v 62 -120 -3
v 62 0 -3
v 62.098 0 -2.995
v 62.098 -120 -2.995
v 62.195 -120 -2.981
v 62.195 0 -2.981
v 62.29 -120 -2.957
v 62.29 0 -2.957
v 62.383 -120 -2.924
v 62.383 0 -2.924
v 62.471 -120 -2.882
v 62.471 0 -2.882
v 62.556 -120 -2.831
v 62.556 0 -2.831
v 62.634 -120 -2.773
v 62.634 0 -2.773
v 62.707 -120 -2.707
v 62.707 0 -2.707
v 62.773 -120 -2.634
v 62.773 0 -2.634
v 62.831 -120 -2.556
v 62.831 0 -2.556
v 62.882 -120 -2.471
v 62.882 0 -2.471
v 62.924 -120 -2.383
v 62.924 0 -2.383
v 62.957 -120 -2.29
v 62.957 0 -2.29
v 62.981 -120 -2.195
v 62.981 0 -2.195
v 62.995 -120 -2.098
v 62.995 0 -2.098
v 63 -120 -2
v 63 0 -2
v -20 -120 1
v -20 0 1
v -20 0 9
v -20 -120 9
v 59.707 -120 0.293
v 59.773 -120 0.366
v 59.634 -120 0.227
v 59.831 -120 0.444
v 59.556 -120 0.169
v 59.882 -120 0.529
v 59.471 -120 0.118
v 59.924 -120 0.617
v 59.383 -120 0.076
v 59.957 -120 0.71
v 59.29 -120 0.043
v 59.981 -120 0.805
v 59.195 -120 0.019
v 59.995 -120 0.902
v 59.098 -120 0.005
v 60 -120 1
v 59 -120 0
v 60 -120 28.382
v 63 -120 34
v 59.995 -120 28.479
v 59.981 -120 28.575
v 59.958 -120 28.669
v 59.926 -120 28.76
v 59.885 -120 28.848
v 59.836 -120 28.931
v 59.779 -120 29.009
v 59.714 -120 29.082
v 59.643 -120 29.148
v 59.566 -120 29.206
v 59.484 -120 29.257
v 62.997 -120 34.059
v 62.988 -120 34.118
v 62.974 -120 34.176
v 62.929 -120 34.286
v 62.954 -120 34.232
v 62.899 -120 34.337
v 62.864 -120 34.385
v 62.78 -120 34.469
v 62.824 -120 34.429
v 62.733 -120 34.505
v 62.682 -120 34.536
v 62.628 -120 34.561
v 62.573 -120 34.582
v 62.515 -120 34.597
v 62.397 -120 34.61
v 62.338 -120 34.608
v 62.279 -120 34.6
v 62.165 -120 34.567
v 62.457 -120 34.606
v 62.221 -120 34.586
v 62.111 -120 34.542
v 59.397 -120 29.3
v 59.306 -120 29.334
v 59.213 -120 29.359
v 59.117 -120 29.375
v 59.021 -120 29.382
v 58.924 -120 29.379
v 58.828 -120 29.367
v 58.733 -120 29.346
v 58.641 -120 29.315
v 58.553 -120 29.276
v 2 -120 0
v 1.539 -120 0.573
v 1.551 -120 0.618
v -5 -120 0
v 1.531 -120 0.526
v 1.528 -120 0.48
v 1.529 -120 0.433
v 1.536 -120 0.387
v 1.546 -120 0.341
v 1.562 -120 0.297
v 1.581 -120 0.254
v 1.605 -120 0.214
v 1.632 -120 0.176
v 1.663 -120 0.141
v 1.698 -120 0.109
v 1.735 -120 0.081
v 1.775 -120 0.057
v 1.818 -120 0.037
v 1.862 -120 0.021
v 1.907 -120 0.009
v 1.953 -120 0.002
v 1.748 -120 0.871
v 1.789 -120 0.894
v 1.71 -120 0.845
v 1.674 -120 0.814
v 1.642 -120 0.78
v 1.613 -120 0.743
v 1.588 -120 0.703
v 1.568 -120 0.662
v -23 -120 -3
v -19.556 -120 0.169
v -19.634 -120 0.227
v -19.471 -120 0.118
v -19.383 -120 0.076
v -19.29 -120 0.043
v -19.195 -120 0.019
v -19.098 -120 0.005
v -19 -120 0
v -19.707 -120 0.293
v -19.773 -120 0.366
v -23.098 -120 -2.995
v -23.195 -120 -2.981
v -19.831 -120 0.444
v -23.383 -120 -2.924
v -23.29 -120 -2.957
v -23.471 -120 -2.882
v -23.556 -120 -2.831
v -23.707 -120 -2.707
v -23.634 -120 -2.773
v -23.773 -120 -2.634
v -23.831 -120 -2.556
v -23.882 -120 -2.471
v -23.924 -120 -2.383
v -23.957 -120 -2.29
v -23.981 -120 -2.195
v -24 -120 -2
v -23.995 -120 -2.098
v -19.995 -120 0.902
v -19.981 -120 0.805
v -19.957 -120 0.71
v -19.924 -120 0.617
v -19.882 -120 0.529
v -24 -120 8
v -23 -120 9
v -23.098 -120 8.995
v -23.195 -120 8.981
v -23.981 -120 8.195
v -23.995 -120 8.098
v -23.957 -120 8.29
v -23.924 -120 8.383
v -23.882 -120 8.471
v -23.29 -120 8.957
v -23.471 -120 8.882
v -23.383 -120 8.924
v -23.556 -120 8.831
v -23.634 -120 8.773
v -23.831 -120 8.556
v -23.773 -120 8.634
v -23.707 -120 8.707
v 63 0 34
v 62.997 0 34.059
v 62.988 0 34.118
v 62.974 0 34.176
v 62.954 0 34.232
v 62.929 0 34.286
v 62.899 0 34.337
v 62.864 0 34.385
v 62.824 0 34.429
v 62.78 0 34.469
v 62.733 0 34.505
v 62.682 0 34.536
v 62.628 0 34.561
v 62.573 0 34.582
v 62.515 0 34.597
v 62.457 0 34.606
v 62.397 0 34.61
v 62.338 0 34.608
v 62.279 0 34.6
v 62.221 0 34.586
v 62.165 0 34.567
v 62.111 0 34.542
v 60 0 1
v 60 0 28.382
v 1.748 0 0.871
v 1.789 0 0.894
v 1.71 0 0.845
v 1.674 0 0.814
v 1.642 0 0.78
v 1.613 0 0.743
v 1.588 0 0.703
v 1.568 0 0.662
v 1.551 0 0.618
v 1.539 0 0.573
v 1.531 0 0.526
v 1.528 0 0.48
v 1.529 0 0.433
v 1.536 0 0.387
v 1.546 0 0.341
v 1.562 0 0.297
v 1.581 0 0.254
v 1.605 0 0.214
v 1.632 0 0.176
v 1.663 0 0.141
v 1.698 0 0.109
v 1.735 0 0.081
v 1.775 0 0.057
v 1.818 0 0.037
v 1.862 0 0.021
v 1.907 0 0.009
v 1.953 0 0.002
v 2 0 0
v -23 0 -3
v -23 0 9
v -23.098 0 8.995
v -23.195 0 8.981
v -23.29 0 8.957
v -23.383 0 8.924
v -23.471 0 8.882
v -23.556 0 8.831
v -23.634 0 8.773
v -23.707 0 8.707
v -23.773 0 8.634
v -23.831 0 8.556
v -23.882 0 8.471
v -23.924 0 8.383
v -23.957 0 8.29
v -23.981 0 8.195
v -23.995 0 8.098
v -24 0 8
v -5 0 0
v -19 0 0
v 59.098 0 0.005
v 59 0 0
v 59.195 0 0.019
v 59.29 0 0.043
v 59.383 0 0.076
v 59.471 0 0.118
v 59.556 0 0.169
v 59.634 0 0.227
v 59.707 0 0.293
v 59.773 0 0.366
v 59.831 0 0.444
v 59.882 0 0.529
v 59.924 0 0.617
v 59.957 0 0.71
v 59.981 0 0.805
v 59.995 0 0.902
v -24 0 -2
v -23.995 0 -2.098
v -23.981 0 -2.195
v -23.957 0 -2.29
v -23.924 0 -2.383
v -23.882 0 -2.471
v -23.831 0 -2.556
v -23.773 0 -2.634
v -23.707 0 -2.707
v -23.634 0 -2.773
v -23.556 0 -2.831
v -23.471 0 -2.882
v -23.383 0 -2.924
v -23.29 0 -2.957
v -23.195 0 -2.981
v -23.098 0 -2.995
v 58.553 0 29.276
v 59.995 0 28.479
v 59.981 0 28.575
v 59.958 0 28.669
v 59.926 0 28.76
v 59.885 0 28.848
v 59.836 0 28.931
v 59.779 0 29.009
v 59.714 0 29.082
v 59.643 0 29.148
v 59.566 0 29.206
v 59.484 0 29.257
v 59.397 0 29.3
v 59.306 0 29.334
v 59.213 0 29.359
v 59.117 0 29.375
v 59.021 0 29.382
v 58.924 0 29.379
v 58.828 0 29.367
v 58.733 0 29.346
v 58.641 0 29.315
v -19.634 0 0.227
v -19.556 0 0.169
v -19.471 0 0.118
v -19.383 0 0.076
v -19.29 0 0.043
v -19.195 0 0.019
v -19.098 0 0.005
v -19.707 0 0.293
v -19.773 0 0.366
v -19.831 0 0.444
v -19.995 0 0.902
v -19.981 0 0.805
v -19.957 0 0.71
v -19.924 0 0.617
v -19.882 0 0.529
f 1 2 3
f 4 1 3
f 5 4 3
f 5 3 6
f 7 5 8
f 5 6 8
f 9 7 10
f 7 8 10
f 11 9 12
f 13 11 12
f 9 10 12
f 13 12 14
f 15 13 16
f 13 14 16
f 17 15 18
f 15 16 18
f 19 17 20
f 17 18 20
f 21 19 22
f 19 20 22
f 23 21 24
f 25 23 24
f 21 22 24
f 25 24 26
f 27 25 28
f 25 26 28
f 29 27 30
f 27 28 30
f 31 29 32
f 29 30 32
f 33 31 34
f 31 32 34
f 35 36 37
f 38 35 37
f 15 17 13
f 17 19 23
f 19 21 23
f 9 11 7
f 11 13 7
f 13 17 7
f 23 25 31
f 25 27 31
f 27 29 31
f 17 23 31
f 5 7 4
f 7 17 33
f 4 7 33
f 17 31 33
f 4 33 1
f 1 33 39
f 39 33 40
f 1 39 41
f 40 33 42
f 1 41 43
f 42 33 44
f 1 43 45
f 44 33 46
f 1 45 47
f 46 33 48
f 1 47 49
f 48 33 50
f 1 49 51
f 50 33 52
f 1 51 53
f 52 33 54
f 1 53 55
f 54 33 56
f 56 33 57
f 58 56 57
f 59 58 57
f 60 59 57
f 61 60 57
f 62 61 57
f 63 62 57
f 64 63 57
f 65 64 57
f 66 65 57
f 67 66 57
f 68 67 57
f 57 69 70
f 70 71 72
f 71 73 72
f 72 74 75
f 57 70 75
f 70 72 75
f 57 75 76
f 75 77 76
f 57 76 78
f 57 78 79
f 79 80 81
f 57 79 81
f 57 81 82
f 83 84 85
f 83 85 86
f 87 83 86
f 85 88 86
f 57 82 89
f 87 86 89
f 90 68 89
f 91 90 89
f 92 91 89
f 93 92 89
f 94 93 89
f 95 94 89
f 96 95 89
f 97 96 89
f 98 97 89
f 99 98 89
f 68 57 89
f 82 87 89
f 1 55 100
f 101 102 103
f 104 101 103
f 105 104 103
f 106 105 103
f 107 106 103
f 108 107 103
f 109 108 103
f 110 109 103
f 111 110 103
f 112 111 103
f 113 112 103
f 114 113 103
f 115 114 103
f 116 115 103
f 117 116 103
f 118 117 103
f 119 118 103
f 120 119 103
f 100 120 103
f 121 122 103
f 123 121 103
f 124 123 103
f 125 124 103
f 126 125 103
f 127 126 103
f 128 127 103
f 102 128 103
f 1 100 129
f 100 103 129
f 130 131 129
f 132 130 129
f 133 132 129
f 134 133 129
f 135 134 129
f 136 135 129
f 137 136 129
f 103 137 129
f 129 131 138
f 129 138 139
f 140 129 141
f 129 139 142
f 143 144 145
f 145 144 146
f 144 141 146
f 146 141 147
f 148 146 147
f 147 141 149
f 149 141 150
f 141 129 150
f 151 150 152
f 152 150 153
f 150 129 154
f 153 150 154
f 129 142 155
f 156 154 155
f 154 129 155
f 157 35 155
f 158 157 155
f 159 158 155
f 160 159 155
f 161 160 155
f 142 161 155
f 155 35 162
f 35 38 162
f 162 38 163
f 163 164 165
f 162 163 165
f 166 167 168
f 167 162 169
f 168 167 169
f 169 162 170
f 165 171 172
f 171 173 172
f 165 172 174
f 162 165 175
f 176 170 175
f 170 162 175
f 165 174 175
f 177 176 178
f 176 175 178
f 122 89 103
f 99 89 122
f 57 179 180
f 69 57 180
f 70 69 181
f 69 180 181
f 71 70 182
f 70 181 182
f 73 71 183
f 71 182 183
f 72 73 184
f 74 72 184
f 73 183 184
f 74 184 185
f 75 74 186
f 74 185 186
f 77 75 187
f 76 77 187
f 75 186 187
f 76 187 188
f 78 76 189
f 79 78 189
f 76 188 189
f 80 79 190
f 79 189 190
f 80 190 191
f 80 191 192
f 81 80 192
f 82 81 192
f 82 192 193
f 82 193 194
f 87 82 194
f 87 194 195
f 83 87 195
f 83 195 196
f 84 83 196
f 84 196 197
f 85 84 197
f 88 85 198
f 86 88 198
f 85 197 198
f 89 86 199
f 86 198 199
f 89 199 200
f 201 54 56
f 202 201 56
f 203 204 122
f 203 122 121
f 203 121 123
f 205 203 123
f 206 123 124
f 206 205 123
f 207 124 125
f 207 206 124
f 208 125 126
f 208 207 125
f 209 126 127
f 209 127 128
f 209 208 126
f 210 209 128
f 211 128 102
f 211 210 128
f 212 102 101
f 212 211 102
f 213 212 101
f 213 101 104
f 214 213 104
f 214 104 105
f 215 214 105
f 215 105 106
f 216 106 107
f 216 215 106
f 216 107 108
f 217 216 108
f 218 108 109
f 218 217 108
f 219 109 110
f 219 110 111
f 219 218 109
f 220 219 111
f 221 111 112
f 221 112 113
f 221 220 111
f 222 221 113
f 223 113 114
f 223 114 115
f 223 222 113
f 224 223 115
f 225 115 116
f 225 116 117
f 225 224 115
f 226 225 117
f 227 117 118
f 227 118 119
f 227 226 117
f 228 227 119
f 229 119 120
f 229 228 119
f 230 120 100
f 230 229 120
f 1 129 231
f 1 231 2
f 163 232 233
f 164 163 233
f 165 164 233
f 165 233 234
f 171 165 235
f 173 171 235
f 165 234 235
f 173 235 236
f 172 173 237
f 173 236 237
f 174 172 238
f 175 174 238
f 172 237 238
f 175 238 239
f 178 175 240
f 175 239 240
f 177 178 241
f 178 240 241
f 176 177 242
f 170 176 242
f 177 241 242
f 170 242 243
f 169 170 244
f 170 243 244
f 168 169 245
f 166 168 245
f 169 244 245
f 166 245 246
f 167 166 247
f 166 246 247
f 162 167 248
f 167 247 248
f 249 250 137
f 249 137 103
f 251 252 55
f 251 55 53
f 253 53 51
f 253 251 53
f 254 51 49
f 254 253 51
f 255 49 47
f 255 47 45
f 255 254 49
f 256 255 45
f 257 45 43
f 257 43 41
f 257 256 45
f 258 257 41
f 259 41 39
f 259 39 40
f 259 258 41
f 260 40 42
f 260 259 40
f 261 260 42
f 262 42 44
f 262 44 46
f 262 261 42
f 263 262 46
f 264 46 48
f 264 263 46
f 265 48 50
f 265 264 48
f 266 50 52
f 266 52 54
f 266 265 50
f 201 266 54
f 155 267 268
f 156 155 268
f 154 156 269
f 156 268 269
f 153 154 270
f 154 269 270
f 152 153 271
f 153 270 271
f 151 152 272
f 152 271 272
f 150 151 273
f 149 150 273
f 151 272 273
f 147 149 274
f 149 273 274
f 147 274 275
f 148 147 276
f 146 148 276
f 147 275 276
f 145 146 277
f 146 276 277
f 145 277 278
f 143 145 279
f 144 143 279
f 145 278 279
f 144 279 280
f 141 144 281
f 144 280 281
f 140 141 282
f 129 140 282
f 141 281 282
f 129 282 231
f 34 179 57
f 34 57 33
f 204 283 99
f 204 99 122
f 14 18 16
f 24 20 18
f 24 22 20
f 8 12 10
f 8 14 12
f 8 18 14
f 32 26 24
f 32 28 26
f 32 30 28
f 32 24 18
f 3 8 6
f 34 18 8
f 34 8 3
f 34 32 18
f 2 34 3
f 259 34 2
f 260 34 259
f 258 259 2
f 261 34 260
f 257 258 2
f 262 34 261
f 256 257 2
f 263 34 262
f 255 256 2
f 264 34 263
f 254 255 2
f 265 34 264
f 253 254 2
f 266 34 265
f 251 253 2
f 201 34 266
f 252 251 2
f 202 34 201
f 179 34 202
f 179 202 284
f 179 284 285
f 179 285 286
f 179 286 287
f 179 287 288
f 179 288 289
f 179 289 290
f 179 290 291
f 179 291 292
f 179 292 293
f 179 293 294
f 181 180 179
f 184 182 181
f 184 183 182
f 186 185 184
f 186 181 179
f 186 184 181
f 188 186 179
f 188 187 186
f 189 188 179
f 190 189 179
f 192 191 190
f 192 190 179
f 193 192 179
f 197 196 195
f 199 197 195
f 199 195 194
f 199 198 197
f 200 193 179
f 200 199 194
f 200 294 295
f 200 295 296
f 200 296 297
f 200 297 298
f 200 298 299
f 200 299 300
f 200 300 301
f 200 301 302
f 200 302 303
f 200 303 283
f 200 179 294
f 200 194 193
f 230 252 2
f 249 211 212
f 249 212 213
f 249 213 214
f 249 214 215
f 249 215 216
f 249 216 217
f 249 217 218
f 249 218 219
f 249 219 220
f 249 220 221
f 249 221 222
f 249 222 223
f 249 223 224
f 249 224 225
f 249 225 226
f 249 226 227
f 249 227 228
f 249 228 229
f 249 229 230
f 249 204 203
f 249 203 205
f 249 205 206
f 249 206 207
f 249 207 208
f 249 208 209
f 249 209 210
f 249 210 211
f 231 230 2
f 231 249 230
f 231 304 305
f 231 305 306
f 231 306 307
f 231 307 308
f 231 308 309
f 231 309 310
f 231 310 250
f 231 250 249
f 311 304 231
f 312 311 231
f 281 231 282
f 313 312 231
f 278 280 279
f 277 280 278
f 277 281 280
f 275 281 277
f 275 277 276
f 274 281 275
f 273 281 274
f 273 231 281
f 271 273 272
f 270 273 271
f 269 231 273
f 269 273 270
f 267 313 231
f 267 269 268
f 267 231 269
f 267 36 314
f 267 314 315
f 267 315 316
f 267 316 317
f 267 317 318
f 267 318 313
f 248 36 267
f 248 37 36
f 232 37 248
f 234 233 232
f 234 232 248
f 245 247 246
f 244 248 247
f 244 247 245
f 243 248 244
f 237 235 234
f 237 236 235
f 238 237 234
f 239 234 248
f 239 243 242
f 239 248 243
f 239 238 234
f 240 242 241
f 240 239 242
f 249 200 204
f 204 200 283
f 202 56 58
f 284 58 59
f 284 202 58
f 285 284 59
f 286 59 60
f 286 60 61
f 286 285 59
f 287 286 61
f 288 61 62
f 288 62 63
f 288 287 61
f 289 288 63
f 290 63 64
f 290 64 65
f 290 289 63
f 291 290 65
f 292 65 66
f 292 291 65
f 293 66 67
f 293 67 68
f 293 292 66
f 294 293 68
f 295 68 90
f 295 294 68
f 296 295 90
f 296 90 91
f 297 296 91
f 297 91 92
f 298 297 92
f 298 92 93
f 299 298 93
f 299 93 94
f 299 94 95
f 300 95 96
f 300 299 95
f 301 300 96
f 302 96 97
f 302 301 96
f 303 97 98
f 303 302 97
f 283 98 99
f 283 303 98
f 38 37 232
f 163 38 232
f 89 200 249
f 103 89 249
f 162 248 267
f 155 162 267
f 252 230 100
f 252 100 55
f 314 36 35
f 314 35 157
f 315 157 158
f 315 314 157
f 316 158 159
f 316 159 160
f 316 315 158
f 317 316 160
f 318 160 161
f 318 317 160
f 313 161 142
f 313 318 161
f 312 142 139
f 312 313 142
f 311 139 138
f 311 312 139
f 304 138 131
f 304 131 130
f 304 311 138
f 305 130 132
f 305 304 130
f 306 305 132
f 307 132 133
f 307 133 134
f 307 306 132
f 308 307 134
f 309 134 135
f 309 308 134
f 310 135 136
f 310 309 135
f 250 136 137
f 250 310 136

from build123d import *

# Parameters (mm, degrees)
PAD_DEPTH = 120


with BuildPart() as part:
    # Sketch → Pad (new body)
    with BuildSketch(Plane.XZ):
        with BuildLine():
            Line((63, 34), (63, -2))
            ThreePointArc((62, -3), (62.707107, -2.707107), (63, -2))
            Line((-23, -3), (62, -3))
            ThreePointArc((-24, -2), (-23.707107, -2.707107), (-23, -3))
            Line((-24, 8), (-24, -2))
            ThreePointArc((-23, 9), (-23.707107, 8.707107), (-24, 8))
            Line((-20, 9), (-23, 9))
            Line((-20, 1), (-20, 9))
            ThreePointArc((-20, 1), (-19.707107, 0.292893), (-19, 0))
            Line((-19, 0), (-5, 0))
            Line((62.110864, 34.542357), (-5, 0))
            ThreePointArc((63, 34), (62.707665, 34.520748), (62.110864, 34.542357))
        make_face()
        with BuildLine():
            Line((2, 0), (59, 0))
            ThreePointArc((59, 0), (59.707107, 0.292893), (60, 1))
            Line((60, 1), (60, 28.381966))
            ThreePointArc((60, 28.381966), (59.525731, 29.232617), (58.552786, 29.276393))
            Line((58.552786, 29.276393), (1.788854, 0.894427))
            ThreePointArc((1.788854, 0.894427), (1.540494, 0.363661), (2, 0))
        make_face(mode=Mode.SUBTRACT)
    extrude(amount=PAD_DEPTH)


solid = part.part
